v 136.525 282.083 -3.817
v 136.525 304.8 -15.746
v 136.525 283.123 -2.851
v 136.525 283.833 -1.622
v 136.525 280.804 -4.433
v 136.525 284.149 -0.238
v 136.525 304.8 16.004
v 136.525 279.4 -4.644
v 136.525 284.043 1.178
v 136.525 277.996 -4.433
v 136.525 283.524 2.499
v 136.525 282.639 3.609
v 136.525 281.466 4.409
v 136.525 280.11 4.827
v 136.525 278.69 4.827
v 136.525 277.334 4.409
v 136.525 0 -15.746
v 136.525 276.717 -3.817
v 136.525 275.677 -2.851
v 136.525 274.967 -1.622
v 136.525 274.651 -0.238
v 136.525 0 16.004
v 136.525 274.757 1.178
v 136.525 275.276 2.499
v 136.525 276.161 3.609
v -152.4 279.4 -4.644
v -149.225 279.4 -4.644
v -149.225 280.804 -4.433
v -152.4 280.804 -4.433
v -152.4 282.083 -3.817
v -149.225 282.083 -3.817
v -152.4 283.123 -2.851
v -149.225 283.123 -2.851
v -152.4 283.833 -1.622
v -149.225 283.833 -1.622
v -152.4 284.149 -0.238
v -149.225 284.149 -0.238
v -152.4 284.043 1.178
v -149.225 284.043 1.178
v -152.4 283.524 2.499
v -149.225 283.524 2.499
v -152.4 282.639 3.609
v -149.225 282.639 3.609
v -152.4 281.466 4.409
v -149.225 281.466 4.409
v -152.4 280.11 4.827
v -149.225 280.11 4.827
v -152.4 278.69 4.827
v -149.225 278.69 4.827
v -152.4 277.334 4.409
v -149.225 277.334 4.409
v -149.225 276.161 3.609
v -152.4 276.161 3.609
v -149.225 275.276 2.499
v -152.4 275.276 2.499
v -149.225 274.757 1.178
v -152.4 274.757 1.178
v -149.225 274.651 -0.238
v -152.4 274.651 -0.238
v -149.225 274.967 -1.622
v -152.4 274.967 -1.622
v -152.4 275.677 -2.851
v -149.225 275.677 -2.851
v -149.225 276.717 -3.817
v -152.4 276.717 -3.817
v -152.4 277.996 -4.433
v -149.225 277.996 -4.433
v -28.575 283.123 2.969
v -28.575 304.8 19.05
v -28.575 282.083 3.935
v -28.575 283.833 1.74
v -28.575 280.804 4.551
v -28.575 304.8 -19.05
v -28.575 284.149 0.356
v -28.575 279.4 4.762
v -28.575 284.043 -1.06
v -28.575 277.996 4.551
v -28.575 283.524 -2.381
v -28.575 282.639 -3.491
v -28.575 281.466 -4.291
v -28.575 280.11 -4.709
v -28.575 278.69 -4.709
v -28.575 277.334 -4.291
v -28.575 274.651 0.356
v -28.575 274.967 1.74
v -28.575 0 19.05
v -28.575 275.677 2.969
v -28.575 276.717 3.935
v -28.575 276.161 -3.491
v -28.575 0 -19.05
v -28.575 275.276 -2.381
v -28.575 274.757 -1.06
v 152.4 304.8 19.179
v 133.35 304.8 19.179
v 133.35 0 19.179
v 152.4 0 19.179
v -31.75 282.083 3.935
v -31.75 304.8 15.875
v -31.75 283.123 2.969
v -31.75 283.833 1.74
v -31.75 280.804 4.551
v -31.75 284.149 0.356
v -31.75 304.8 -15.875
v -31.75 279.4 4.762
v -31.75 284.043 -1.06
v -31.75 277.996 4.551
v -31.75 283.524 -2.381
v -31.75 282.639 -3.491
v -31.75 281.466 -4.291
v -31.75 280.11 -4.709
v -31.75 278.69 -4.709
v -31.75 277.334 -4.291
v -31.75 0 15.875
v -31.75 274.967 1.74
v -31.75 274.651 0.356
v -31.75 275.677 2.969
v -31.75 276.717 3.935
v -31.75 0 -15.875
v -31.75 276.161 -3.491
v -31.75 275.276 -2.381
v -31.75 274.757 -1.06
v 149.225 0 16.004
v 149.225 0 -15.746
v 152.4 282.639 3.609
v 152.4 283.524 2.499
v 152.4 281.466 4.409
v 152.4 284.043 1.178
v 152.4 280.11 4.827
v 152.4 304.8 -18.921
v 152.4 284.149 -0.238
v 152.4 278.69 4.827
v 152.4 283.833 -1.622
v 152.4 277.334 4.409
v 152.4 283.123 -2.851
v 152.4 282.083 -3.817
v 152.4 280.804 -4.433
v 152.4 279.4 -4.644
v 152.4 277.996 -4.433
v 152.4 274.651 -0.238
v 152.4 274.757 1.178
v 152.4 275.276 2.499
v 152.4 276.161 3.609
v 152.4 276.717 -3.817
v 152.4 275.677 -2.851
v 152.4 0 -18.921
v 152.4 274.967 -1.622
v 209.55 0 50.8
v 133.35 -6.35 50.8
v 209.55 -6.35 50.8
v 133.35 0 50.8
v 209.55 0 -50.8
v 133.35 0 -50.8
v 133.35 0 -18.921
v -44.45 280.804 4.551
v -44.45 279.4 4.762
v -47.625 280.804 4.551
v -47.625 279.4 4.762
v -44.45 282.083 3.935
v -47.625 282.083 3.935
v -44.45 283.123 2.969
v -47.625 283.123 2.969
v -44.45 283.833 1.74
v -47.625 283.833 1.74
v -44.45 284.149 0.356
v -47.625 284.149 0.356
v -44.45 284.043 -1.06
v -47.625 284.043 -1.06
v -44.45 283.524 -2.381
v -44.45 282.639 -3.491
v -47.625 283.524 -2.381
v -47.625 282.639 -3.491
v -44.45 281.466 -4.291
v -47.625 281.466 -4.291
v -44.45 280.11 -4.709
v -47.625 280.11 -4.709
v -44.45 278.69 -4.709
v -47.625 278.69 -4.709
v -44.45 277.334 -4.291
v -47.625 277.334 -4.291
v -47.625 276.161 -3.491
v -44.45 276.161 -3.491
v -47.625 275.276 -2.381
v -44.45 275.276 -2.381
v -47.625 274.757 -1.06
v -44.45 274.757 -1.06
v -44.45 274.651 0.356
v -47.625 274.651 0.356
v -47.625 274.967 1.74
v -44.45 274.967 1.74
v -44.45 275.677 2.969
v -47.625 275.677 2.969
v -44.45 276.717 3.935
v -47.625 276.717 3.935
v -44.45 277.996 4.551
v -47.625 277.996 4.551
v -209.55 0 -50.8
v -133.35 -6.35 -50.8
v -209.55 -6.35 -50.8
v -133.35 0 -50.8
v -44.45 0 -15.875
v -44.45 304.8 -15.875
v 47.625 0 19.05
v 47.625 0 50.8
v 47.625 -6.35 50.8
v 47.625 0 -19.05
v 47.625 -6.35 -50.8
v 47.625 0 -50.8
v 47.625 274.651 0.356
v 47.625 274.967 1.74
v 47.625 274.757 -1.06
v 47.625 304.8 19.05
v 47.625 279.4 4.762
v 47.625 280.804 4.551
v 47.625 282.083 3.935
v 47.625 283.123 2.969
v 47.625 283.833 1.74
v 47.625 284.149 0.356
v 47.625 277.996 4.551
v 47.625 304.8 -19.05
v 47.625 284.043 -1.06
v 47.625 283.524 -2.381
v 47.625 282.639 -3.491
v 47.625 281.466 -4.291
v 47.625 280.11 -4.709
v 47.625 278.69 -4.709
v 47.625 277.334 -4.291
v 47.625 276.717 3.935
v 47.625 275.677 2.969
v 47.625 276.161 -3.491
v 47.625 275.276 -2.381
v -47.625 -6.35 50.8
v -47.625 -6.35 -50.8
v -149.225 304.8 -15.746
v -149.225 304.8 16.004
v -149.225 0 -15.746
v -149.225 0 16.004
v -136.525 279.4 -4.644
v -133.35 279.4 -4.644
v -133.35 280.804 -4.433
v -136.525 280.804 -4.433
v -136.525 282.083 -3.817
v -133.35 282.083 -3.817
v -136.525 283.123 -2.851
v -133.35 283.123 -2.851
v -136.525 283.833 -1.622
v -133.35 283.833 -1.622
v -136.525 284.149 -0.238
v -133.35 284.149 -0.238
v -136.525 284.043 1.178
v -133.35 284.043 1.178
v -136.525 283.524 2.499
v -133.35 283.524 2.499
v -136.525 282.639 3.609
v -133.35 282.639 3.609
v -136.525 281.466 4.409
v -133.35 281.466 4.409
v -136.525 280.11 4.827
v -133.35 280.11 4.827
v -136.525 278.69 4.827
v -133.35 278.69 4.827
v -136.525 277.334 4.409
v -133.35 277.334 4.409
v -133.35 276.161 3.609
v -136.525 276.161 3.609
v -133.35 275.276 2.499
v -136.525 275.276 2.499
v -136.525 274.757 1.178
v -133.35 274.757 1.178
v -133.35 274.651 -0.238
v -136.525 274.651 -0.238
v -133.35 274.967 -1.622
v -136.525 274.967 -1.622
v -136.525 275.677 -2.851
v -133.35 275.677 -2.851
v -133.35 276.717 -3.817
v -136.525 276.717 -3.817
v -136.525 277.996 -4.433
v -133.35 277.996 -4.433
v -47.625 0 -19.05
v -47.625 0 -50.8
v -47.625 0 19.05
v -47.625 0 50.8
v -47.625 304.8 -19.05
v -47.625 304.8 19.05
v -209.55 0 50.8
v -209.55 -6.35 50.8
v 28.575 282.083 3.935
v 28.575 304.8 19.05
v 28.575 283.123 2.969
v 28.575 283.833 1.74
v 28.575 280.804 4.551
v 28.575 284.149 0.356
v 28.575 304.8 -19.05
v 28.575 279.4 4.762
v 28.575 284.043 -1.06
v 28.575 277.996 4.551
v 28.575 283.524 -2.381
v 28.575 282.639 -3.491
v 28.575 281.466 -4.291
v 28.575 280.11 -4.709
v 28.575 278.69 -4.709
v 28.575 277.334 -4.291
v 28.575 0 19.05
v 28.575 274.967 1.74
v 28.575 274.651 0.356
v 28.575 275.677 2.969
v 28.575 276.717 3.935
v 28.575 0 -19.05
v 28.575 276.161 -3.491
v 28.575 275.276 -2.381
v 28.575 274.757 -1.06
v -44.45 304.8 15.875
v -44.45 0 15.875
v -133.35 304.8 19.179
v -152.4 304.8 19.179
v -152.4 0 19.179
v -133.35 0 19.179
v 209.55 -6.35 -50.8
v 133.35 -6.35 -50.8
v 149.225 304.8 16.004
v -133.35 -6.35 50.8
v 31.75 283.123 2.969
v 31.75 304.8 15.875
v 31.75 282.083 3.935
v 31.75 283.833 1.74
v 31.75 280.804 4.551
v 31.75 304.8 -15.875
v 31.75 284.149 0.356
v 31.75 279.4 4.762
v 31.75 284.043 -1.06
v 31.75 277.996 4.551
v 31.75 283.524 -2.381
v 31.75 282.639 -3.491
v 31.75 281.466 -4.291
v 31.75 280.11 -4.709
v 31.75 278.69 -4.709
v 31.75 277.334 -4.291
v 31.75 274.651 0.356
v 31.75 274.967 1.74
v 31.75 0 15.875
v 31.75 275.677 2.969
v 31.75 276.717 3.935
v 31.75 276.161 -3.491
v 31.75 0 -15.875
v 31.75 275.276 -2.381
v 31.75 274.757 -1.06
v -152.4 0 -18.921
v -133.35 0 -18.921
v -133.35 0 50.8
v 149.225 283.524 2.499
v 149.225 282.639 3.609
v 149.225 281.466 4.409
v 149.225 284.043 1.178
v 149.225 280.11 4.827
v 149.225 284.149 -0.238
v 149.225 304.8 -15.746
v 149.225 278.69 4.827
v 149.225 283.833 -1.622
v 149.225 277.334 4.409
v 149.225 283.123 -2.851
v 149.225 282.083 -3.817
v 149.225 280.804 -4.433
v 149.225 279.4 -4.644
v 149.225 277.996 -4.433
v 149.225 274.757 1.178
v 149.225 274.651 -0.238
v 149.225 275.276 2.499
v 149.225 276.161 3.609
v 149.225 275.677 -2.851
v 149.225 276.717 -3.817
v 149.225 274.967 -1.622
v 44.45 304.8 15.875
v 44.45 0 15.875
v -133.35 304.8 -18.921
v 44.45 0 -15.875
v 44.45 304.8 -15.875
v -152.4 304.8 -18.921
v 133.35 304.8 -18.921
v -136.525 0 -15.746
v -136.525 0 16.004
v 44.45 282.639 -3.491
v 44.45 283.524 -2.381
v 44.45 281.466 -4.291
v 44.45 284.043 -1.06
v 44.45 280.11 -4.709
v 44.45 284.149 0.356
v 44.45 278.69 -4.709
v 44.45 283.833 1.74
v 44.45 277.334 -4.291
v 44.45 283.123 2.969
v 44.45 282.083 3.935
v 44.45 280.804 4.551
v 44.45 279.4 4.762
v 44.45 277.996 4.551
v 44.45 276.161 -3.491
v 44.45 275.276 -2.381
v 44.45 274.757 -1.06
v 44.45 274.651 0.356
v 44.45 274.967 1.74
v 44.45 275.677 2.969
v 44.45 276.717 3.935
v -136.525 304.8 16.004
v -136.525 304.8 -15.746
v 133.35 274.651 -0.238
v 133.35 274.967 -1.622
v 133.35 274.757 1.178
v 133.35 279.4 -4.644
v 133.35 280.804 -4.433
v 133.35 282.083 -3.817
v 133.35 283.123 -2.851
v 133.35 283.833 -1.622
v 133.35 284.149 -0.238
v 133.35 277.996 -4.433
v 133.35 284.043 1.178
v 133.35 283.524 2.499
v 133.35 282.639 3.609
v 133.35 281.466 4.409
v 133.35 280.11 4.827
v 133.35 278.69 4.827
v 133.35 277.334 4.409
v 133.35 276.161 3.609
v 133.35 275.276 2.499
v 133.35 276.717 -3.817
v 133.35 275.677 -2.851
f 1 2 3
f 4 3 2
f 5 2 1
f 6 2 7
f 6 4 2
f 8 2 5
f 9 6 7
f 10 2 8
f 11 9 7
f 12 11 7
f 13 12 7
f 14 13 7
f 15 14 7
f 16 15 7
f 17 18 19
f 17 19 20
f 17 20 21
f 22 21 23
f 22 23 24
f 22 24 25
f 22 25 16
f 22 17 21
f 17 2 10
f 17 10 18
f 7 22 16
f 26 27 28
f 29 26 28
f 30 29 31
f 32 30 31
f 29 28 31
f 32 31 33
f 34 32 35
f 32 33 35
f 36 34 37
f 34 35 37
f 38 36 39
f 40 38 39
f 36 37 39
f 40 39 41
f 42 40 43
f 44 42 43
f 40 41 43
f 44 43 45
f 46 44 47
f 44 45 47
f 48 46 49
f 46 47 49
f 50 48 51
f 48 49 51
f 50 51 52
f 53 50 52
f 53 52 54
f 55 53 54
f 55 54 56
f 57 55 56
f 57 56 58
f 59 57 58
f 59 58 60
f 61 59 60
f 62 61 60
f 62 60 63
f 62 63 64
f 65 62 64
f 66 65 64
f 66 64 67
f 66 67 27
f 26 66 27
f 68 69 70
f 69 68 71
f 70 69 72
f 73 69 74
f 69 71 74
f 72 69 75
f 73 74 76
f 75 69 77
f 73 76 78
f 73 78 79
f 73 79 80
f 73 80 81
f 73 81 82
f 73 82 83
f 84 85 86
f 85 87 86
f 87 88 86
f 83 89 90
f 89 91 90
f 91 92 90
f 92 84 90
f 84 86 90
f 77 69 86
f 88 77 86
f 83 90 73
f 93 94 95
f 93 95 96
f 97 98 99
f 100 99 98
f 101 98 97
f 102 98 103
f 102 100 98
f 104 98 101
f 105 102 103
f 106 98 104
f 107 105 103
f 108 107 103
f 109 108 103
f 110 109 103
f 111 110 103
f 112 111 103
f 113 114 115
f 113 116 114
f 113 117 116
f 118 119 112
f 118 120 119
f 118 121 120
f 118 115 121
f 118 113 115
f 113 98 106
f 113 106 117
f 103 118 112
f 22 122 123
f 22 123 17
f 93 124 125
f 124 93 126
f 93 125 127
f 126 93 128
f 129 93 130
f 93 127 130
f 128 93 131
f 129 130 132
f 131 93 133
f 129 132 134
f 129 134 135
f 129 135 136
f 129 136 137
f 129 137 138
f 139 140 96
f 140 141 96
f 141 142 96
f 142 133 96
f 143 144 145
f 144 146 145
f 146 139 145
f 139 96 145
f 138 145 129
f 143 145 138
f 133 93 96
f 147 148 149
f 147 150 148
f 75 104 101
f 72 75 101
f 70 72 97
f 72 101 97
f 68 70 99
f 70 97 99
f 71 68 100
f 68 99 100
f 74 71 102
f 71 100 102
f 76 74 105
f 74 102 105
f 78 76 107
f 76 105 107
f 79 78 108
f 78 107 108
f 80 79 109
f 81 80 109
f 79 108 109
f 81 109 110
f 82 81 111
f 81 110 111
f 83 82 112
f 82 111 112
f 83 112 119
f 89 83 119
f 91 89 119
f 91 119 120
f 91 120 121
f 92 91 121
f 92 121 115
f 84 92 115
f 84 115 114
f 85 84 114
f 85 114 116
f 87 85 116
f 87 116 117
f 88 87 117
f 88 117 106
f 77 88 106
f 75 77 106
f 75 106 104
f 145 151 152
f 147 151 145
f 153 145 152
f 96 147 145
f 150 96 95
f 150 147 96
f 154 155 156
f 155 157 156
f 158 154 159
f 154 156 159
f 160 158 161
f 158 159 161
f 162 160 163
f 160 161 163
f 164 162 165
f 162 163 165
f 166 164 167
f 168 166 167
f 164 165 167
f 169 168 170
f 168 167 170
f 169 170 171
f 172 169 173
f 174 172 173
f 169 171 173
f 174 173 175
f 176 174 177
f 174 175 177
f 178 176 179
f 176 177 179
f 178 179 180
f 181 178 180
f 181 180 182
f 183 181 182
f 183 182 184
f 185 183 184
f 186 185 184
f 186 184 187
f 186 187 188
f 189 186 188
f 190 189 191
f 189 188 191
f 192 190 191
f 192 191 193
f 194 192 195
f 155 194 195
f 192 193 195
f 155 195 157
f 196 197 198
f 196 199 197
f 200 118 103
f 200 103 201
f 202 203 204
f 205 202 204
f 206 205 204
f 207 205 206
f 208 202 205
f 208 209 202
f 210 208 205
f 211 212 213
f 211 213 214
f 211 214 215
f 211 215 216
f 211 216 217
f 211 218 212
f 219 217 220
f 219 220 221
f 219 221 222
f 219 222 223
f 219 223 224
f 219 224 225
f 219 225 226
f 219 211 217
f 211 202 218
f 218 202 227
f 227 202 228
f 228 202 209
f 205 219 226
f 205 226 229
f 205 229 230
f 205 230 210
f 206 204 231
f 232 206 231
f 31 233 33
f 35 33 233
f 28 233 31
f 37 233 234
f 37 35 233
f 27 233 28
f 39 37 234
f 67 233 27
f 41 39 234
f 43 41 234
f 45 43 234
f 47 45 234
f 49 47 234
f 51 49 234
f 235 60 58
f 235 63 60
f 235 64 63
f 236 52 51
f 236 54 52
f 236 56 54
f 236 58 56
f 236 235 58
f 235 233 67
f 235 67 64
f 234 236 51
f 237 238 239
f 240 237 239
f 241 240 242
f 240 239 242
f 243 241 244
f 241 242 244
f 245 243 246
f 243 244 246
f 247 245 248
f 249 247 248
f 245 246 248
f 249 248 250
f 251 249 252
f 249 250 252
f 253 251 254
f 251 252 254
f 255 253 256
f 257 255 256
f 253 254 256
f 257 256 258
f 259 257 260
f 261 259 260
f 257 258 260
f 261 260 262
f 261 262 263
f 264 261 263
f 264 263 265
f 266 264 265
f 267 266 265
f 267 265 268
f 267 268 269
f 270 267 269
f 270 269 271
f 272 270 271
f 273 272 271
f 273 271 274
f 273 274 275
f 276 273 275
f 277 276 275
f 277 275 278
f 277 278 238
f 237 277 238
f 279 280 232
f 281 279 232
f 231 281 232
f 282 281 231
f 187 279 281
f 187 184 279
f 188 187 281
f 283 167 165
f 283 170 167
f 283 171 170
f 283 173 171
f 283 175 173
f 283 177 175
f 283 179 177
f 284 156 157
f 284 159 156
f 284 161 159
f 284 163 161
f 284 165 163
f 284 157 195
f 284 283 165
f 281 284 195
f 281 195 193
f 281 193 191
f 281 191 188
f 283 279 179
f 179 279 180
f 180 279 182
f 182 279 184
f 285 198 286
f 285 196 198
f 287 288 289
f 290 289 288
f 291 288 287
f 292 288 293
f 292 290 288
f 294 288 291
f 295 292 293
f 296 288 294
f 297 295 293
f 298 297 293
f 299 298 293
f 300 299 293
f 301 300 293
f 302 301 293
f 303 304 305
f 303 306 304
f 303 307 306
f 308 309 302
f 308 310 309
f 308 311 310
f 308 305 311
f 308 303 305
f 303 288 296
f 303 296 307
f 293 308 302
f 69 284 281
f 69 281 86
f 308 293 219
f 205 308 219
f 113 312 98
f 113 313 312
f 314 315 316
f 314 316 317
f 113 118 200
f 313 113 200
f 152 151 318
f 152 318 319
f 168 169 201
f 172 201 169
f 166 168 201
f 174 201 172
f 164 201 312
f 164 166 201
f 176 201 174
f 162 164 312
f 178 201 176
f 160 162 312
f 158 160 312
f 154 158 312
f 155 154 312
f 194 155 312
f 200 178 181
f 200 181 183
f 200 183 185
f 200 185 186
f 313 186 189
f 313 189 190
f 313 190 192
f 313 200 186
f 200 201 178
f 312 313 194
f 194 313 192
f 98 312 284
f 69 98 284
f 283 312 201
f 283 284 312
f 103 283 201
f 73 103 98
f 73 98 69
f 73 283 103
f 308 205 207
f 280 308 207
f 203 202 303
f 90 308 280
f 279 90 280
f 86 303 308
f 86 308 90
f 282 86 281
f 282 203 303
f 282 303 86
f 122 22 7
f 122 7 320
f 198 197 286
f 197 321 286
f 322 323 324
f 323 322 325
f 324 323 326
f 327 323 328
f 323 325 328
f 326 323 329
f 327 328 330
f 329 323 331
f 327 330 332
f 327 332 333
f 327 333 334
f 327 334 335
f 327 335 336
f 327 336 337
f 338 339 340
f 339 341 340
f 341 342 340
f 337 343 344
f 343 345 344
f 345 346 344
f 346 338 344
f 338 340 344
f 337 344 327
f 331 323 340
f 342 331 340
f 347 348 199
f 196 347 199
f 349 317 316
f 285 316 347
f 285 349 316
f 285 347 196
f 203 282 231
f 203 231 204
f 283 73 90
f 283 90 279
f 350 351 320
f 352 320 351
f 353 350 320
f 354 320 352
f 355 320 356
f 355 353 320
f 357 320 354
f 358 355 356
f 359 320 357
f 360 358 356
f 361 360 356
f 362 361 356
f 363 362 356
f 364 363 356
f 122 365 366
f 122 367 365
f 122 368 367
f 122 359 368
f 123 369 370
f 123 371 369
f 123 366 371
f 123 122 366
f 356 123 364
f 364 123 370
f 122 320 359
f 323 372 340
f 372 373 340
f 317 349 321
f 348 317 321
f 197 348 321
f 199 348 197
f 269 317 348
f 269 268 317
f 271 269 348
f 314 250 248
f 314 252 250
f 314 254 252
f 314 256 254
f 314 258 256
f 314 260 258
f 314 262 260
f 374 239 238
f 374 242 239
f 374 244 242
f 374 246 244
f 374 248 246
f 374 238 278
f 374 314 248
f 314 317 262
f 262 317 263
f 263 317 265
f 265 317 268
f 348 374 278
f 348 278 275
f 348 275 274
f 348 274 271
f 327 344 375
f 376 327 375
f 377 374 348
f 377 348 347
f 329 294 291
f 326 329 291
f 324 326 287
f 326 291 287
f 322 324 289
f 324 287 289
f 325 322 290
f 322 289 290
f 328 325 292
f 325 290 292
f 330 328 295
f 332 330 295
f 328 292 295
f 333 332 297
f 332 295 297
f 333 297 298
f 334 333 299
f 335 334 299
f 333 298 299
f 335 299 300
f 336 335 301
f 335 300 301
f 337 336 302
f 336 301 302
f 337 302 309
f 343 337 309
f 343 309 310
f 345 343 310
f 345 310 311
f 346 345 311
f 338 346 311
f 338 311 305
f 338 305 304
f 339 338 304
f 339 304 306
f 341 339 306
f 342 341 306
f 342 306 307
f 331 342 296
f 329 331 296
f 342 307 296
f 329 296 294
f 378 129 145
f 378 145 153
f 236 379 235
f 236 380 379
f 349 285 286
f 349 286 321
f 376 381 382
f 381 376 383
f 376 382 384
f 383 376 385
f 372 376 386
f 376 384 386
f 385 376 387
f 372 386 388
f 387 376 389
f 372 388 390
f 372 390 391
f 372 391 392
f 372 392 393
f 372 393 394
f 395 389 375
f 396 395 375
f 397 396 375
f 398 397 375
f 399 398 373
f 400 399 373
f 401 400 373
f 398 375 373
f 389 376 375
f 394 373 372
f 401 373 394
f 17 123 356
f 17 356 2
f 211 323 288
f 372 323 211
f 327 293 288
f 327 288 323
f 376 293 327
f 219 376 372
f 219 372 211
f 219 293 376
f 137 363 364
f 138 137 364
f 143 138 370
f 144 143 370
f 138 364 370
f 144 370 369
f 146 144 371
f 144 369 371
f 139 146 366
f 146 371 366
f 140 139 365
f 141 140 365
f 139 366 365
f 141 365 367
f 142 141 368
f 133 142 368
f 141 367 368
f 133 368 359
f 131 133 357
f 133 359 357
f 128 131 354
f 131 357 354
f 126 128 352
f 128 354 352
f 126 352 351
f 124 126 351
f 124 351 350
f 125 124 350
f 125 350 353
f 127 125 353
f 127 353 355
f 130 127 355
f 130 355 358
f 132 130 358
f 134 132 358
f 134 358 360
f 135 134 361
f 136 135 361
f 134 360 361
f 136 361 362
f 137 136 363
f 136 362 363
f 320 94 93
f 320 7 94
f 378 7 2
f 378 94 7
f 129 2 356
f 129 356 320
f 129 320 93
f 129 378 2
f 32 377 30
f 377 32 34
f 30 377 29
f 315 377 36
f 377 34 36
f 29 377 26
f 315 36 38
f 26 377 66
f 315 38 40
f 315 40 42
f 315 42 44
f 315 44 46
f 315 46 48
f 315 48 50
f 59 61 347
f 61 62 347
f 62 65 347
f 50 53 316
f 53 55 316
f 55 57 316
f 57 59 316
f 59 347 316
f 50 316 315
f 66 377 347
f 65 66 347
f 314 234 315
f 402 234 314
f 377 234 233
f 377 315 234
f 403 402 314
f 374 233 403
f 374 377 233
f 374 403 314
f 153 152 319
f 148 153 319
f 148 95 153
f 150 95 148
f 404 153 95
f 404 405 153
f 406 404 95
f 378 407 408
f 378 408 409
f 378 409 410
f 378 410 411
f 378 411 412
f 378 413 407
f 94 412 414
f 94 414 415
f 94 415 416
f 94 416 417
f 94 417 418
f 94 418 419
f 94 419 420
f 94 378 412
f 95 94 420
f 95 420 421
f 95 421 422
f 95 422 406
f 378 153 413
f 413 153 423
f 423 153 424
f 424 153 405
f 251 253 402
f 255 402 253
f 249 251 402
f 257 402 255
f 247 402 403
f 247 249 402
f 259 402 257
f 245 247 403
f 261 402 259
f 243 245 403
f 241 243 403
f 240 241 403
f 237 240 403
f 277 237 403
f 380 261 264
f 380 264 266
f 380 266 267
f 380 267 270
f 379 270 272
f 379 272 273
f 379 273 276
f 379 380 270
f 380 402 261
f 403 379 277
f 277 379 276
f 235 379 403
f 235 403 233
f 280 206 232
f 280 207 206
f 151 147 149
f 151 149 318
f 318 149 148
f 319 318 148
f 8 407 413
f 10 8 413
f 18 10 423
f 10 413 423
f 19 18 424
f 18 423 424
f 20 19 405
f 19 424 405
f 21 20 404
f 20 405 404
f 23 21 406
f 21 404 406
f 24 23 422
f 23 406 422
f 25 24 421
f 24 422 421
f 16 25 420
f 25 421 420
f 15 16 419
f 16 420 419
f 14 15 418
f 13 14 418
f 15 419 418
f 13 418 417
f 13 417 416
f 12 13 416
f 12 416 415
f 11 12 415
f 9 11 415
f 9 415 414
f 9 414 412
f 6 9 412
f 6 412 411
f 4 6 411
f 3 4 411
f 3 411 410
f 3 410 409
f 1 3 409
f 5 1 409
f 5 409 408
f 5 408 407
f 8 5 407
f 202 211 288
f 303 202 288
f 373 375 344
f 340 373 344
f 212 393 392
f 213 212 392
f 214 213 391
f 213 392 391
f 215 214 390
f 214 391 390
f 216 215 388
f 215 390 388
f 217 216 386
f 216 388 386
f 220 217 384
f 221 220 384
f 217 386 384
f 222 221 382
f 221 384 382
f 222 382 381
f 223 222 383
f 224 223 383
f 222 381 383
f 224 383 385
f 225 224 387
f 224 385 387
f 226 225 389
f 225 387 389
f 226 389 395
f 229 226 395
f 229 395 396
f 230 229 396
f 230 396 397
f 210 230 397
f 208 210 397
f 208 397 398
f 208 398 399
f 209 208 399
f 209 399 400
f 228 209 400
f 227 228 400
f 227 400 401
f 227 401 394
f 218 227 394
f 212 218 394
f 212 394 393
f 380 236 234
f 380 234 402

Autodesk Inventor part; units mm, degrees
ref_plane "YZ Plane" through (0, 0, 0) normal (1, 0, 0) x (0, 1, 0)
ref_plane "XZ Plane" through (0, 0, 0) normal (0, 1, 0) x (-1, 0, 0)
ref_plane "XY Plane" through (0, 0, 0) normal (0, 0, 1) x (1, 0, 0)
sketch "Sketch1" plane through (0, 0, 0) normal (0, 1, 0) x (-1, 0, 0)
  line L0 (47.625, 50.8) -> (-47.625, 50.8)
  line L1 (-47.625, 50.8) -> (-47.625, -50.8)
  line L2 (-47.625, -50.8) -> (47.625, -50.8)
  line L3 (47.625, -50.8) -> (47.625, 50.8)
  line L4 (47.625, 50.8) -> (-47.625, -50.8) construction
  line L5 (-47.625, 50.8) -> (47.625, -50.8) construction
  point P0 (0, 0)
  dimension "d0" = 95.25
  dimension "d1" = 101.6
extrude "Extrusion1" add sketch "Sketch1" against normal blind 6.35
sketch "Sketch2" plane through (0, 0, 0) normal (0, 1, 0) x (1, 0, 0)
  line L0 (-47.625, -19.05) -> (-28.575, -19.05)
  line L1 (-28.575, -19.05) -> (-28.575, 19.05)
  line L2 (-28.575, 19.05) -> (-47.625, 19.05)
  line L3 (-47.625, 19.05) -> (-47.625, -19.05)
  line L4 (-47.625, -19.05) -> (-28.575, 19.05) construction
  line L5 (-28.575, -19.05) -> (-47.625, 19.05) construction
  line L6 (-44.45, -15.875) -> (-31.75, -15.875)
  line L7 (-31.75, -15.875) -> (-31.75, 15.875)
  line L8 (-31.75, 15.875) -> (-44.45, 15.875)
  line L9 (-44.45, 15.875) -> (-44.45, -15.875)
  line L10 (-44.45, -15.875) -> (-31.75, 15.875) construction
  line L11 (-31.75, -15.875) -> (-44.45, 15.875) construction
  line L12 (-47.625, 50.8) -> (47.625, 50.8) construction
  line L13 (0, 50.8) -> (0, -101.6) construction
  line L14 (47.625, -19.05) -> (28.575, -19.05)
  line L15 (28.575, -19.05) -> (28.575, 19.05)
  line L16 (28.575, 19.05) -> (47.625, 19.05)
  line L17 (47.625, 19.05) -> (47.625, -19.05)
  line L18 (44.45, -15.875) -> (31.75, -15.875)
  line L19 (31.75, -15.875) -> (31.75, 15.875)
  line L20 (31.75, 15.875) -> (44.45, 15.875)
  line L21 (44.45, 15.875) -> (44.45, -15.875)
  point P0 (0, 0)
  point P1 (-38.1, 0)
  dimension "d4" = 38.1
  dimension "d5" = 19.05
  dimension "d6" = 38.1
  dimension "d7" = 3.175
  dimension "d8" = 3.175
extrude "Extrusion2" add sketch "Sketch2" along normal blind 304.8
sketch "Sketch4" plane through (-47.625, -6.35, -50.8) normal (-1, 0, 0) x (0, 0, 1)
  line L0 (50.8, 6.35) -> (50.8, 96.458) construction
  circle A0 centre (50.8, 285.75) radius 4.7625
  line L1 (0, 6.35) -> (31.75, 6.35) projected
  dimension "d15" = 9.525
  dimension "d16" = 279.4
extrude "Extrusion4" cut sketch "Sketch4" against normal through all
sketch "Sketch6" plane through (0, 0, 0) normal (0, 1, 0) x (-1, 0, 0)
  line L0 (209.55, 50.8) -> (133.35, 50.8)
  line L1 (133.35, 50.8) -> (133.35, -50.8)
  line L2 (133.35, -50.8) -> (209.55, -50.8)
  line L3 (209.55, -50.8) -> (209.55, 50.8)
  line L4 (209.55, 50.8) -> (133.35, -50.8) construction
  line L5 (133.35, 50.8) -> (209.55, -50.8) construction
  point P0 (0, 0)
  point P1 (171.45, 0)
  dimension "d19" = 101.6
  dimension "d20" = 76.2
  dimension "d21" = 209.55
extrude "Extrusion5" add sketch "Sketch6" against normal blind 6.35
sketch "Sketch7" plane through (0, 0, 0) normal (0, 1, 0) x (1, 0, 0)
  line L0 (-152.4, -19.1787) -> (-133.35, -19.1787)
  line L1 (-133.35, -19.1787) -> (-133.35, 18.9213)
  line L2 (-133.35, 18.9213) -> (-152.4, 18.9213)
  line L3 (-152.4, 18.9213) -> (-152.4, -19.1787)
  line L4 (-152.4, -19.1787) -> (-133.35, 18.9213) construction
  line L5 (-133.35, -19.1787) -> (-152.4, 18.9213) construction
  line L6 (-149.225, -16.0037) -> (-136.525, -16.0037)
  line L7 (-136.525, -16.0037) -> (-136.525, 15.7463)
  line L8 (-136.525, 15.7463) -> (-149.225, 15.7463)
  line L9 (-149.225, 15.7463) -> (-149.225, -16.0037)
  line L10 (-149.225, -16.0037) -> (-136.525, 15.7463) construction
  line L11 (-136.525, -16.0037) -> (-149.225, 15.7463) construction
  line L12 (-133.35, -50.8) -> (-133.35, 50.8) projected
  point P0 (0, 0)
  point P1 (-142.875, -0.1287)
  dimension "d24" = 19.05
  dimension "d25" = 38.1
  dimension "d26" = 3.175
  dimension "d27" = 3.175
extrude "Extrusion6" add sketch "Sketch7" along normal blind 304.8
sketch "Sketch8" plane through (-133.35, -6.35, 50.8) normal (1, 0, 0) x (0, 0, -1)
  line L0 (50.8, 6.35) -> (50.6713, 311.15) construction
  line L1 (34.7963, 311.15) -> (66.5463, 311.15) construction
  circle A0 centre (50.682, 285.75) radius 4.7625
  line L2 (101.6, 6.35) -> (0, 6.35) projected
  dimension "d30" = 9.525
  dimension "d31" = 279.4
extrude "Extrusion7" cut sketch "Sketch8" against normal through all
mirror "Mirror1" about plane through (0, 0, 0) normal (1, 0, 0) of "Extrusion6", "Extrusion7", "Extrusion5"
equation "\"d0\" = BaseWidth"
equation "\"d1\" = BaseLength"
equation "\"d2\" = BaseThickness"
equation "\"d4\" = postCenterDistanceFromCenterOfBase"
equation "\"d5\" = postWidth"
equation "\"d6\" = postLength"
equation "\"d7\" = postThickness"
equation "\"d8\" = postThickness"
equation "\"d9\" = postHeight"
equation "\"d15\" = axelDiam"
equation "\"d16\" = axelHeightAbovePlate"
equation "\"d19\" = BaseLength"
equation "\"d20\" = baseForArmWidth"
equation "\"d21\" = 0.5 * robotBaseWidth"
equation "\"d22\" = BaseThickness"
equation "\"d24\" = postWidth"
equation "\"d25\" = postLength"
equation "\"d26\" = postThickness"
equation "\"d27\" = postThickness"
equation "\"d28\" = postHeight"
equation "\"d30\" = axelDiam"
equation "\"d31\" = axelHeightAbovePlate"
equation "\"d32\" = postHeight"
equation "\"BaseWidth\" = 95.25"
equation "\"BaseLength\" = 101.6"
equation "\"BaseThickness\" = 6.35"
equation "\"postWidth\" = 19.05"
equation "\"postLength\" = 38.1"
equation "\"postThickness\" = 3.175"
equation "\"postCenterDistanceFromCenterOfBase\" = 38.1"
equation "\"postHeight\" = 304.8"
equation "\"axelDiam\" = 9.525"
equation "\"baseForArmWidth\" = 76.2"
equation "\"robotBaseWidth\" = 419.1"
equation "\"telescopeArmWidth\" = 44.45"
equation "\"postToSupportArmAxelDistanceFromCenter\" = 0.5 * robotBaseWidth - baseForArmWidth"
equation "\"axelHeightAbovePlate\" = 279.4"
properties part number "RearPostForLift" material "Aluminum 6061"
